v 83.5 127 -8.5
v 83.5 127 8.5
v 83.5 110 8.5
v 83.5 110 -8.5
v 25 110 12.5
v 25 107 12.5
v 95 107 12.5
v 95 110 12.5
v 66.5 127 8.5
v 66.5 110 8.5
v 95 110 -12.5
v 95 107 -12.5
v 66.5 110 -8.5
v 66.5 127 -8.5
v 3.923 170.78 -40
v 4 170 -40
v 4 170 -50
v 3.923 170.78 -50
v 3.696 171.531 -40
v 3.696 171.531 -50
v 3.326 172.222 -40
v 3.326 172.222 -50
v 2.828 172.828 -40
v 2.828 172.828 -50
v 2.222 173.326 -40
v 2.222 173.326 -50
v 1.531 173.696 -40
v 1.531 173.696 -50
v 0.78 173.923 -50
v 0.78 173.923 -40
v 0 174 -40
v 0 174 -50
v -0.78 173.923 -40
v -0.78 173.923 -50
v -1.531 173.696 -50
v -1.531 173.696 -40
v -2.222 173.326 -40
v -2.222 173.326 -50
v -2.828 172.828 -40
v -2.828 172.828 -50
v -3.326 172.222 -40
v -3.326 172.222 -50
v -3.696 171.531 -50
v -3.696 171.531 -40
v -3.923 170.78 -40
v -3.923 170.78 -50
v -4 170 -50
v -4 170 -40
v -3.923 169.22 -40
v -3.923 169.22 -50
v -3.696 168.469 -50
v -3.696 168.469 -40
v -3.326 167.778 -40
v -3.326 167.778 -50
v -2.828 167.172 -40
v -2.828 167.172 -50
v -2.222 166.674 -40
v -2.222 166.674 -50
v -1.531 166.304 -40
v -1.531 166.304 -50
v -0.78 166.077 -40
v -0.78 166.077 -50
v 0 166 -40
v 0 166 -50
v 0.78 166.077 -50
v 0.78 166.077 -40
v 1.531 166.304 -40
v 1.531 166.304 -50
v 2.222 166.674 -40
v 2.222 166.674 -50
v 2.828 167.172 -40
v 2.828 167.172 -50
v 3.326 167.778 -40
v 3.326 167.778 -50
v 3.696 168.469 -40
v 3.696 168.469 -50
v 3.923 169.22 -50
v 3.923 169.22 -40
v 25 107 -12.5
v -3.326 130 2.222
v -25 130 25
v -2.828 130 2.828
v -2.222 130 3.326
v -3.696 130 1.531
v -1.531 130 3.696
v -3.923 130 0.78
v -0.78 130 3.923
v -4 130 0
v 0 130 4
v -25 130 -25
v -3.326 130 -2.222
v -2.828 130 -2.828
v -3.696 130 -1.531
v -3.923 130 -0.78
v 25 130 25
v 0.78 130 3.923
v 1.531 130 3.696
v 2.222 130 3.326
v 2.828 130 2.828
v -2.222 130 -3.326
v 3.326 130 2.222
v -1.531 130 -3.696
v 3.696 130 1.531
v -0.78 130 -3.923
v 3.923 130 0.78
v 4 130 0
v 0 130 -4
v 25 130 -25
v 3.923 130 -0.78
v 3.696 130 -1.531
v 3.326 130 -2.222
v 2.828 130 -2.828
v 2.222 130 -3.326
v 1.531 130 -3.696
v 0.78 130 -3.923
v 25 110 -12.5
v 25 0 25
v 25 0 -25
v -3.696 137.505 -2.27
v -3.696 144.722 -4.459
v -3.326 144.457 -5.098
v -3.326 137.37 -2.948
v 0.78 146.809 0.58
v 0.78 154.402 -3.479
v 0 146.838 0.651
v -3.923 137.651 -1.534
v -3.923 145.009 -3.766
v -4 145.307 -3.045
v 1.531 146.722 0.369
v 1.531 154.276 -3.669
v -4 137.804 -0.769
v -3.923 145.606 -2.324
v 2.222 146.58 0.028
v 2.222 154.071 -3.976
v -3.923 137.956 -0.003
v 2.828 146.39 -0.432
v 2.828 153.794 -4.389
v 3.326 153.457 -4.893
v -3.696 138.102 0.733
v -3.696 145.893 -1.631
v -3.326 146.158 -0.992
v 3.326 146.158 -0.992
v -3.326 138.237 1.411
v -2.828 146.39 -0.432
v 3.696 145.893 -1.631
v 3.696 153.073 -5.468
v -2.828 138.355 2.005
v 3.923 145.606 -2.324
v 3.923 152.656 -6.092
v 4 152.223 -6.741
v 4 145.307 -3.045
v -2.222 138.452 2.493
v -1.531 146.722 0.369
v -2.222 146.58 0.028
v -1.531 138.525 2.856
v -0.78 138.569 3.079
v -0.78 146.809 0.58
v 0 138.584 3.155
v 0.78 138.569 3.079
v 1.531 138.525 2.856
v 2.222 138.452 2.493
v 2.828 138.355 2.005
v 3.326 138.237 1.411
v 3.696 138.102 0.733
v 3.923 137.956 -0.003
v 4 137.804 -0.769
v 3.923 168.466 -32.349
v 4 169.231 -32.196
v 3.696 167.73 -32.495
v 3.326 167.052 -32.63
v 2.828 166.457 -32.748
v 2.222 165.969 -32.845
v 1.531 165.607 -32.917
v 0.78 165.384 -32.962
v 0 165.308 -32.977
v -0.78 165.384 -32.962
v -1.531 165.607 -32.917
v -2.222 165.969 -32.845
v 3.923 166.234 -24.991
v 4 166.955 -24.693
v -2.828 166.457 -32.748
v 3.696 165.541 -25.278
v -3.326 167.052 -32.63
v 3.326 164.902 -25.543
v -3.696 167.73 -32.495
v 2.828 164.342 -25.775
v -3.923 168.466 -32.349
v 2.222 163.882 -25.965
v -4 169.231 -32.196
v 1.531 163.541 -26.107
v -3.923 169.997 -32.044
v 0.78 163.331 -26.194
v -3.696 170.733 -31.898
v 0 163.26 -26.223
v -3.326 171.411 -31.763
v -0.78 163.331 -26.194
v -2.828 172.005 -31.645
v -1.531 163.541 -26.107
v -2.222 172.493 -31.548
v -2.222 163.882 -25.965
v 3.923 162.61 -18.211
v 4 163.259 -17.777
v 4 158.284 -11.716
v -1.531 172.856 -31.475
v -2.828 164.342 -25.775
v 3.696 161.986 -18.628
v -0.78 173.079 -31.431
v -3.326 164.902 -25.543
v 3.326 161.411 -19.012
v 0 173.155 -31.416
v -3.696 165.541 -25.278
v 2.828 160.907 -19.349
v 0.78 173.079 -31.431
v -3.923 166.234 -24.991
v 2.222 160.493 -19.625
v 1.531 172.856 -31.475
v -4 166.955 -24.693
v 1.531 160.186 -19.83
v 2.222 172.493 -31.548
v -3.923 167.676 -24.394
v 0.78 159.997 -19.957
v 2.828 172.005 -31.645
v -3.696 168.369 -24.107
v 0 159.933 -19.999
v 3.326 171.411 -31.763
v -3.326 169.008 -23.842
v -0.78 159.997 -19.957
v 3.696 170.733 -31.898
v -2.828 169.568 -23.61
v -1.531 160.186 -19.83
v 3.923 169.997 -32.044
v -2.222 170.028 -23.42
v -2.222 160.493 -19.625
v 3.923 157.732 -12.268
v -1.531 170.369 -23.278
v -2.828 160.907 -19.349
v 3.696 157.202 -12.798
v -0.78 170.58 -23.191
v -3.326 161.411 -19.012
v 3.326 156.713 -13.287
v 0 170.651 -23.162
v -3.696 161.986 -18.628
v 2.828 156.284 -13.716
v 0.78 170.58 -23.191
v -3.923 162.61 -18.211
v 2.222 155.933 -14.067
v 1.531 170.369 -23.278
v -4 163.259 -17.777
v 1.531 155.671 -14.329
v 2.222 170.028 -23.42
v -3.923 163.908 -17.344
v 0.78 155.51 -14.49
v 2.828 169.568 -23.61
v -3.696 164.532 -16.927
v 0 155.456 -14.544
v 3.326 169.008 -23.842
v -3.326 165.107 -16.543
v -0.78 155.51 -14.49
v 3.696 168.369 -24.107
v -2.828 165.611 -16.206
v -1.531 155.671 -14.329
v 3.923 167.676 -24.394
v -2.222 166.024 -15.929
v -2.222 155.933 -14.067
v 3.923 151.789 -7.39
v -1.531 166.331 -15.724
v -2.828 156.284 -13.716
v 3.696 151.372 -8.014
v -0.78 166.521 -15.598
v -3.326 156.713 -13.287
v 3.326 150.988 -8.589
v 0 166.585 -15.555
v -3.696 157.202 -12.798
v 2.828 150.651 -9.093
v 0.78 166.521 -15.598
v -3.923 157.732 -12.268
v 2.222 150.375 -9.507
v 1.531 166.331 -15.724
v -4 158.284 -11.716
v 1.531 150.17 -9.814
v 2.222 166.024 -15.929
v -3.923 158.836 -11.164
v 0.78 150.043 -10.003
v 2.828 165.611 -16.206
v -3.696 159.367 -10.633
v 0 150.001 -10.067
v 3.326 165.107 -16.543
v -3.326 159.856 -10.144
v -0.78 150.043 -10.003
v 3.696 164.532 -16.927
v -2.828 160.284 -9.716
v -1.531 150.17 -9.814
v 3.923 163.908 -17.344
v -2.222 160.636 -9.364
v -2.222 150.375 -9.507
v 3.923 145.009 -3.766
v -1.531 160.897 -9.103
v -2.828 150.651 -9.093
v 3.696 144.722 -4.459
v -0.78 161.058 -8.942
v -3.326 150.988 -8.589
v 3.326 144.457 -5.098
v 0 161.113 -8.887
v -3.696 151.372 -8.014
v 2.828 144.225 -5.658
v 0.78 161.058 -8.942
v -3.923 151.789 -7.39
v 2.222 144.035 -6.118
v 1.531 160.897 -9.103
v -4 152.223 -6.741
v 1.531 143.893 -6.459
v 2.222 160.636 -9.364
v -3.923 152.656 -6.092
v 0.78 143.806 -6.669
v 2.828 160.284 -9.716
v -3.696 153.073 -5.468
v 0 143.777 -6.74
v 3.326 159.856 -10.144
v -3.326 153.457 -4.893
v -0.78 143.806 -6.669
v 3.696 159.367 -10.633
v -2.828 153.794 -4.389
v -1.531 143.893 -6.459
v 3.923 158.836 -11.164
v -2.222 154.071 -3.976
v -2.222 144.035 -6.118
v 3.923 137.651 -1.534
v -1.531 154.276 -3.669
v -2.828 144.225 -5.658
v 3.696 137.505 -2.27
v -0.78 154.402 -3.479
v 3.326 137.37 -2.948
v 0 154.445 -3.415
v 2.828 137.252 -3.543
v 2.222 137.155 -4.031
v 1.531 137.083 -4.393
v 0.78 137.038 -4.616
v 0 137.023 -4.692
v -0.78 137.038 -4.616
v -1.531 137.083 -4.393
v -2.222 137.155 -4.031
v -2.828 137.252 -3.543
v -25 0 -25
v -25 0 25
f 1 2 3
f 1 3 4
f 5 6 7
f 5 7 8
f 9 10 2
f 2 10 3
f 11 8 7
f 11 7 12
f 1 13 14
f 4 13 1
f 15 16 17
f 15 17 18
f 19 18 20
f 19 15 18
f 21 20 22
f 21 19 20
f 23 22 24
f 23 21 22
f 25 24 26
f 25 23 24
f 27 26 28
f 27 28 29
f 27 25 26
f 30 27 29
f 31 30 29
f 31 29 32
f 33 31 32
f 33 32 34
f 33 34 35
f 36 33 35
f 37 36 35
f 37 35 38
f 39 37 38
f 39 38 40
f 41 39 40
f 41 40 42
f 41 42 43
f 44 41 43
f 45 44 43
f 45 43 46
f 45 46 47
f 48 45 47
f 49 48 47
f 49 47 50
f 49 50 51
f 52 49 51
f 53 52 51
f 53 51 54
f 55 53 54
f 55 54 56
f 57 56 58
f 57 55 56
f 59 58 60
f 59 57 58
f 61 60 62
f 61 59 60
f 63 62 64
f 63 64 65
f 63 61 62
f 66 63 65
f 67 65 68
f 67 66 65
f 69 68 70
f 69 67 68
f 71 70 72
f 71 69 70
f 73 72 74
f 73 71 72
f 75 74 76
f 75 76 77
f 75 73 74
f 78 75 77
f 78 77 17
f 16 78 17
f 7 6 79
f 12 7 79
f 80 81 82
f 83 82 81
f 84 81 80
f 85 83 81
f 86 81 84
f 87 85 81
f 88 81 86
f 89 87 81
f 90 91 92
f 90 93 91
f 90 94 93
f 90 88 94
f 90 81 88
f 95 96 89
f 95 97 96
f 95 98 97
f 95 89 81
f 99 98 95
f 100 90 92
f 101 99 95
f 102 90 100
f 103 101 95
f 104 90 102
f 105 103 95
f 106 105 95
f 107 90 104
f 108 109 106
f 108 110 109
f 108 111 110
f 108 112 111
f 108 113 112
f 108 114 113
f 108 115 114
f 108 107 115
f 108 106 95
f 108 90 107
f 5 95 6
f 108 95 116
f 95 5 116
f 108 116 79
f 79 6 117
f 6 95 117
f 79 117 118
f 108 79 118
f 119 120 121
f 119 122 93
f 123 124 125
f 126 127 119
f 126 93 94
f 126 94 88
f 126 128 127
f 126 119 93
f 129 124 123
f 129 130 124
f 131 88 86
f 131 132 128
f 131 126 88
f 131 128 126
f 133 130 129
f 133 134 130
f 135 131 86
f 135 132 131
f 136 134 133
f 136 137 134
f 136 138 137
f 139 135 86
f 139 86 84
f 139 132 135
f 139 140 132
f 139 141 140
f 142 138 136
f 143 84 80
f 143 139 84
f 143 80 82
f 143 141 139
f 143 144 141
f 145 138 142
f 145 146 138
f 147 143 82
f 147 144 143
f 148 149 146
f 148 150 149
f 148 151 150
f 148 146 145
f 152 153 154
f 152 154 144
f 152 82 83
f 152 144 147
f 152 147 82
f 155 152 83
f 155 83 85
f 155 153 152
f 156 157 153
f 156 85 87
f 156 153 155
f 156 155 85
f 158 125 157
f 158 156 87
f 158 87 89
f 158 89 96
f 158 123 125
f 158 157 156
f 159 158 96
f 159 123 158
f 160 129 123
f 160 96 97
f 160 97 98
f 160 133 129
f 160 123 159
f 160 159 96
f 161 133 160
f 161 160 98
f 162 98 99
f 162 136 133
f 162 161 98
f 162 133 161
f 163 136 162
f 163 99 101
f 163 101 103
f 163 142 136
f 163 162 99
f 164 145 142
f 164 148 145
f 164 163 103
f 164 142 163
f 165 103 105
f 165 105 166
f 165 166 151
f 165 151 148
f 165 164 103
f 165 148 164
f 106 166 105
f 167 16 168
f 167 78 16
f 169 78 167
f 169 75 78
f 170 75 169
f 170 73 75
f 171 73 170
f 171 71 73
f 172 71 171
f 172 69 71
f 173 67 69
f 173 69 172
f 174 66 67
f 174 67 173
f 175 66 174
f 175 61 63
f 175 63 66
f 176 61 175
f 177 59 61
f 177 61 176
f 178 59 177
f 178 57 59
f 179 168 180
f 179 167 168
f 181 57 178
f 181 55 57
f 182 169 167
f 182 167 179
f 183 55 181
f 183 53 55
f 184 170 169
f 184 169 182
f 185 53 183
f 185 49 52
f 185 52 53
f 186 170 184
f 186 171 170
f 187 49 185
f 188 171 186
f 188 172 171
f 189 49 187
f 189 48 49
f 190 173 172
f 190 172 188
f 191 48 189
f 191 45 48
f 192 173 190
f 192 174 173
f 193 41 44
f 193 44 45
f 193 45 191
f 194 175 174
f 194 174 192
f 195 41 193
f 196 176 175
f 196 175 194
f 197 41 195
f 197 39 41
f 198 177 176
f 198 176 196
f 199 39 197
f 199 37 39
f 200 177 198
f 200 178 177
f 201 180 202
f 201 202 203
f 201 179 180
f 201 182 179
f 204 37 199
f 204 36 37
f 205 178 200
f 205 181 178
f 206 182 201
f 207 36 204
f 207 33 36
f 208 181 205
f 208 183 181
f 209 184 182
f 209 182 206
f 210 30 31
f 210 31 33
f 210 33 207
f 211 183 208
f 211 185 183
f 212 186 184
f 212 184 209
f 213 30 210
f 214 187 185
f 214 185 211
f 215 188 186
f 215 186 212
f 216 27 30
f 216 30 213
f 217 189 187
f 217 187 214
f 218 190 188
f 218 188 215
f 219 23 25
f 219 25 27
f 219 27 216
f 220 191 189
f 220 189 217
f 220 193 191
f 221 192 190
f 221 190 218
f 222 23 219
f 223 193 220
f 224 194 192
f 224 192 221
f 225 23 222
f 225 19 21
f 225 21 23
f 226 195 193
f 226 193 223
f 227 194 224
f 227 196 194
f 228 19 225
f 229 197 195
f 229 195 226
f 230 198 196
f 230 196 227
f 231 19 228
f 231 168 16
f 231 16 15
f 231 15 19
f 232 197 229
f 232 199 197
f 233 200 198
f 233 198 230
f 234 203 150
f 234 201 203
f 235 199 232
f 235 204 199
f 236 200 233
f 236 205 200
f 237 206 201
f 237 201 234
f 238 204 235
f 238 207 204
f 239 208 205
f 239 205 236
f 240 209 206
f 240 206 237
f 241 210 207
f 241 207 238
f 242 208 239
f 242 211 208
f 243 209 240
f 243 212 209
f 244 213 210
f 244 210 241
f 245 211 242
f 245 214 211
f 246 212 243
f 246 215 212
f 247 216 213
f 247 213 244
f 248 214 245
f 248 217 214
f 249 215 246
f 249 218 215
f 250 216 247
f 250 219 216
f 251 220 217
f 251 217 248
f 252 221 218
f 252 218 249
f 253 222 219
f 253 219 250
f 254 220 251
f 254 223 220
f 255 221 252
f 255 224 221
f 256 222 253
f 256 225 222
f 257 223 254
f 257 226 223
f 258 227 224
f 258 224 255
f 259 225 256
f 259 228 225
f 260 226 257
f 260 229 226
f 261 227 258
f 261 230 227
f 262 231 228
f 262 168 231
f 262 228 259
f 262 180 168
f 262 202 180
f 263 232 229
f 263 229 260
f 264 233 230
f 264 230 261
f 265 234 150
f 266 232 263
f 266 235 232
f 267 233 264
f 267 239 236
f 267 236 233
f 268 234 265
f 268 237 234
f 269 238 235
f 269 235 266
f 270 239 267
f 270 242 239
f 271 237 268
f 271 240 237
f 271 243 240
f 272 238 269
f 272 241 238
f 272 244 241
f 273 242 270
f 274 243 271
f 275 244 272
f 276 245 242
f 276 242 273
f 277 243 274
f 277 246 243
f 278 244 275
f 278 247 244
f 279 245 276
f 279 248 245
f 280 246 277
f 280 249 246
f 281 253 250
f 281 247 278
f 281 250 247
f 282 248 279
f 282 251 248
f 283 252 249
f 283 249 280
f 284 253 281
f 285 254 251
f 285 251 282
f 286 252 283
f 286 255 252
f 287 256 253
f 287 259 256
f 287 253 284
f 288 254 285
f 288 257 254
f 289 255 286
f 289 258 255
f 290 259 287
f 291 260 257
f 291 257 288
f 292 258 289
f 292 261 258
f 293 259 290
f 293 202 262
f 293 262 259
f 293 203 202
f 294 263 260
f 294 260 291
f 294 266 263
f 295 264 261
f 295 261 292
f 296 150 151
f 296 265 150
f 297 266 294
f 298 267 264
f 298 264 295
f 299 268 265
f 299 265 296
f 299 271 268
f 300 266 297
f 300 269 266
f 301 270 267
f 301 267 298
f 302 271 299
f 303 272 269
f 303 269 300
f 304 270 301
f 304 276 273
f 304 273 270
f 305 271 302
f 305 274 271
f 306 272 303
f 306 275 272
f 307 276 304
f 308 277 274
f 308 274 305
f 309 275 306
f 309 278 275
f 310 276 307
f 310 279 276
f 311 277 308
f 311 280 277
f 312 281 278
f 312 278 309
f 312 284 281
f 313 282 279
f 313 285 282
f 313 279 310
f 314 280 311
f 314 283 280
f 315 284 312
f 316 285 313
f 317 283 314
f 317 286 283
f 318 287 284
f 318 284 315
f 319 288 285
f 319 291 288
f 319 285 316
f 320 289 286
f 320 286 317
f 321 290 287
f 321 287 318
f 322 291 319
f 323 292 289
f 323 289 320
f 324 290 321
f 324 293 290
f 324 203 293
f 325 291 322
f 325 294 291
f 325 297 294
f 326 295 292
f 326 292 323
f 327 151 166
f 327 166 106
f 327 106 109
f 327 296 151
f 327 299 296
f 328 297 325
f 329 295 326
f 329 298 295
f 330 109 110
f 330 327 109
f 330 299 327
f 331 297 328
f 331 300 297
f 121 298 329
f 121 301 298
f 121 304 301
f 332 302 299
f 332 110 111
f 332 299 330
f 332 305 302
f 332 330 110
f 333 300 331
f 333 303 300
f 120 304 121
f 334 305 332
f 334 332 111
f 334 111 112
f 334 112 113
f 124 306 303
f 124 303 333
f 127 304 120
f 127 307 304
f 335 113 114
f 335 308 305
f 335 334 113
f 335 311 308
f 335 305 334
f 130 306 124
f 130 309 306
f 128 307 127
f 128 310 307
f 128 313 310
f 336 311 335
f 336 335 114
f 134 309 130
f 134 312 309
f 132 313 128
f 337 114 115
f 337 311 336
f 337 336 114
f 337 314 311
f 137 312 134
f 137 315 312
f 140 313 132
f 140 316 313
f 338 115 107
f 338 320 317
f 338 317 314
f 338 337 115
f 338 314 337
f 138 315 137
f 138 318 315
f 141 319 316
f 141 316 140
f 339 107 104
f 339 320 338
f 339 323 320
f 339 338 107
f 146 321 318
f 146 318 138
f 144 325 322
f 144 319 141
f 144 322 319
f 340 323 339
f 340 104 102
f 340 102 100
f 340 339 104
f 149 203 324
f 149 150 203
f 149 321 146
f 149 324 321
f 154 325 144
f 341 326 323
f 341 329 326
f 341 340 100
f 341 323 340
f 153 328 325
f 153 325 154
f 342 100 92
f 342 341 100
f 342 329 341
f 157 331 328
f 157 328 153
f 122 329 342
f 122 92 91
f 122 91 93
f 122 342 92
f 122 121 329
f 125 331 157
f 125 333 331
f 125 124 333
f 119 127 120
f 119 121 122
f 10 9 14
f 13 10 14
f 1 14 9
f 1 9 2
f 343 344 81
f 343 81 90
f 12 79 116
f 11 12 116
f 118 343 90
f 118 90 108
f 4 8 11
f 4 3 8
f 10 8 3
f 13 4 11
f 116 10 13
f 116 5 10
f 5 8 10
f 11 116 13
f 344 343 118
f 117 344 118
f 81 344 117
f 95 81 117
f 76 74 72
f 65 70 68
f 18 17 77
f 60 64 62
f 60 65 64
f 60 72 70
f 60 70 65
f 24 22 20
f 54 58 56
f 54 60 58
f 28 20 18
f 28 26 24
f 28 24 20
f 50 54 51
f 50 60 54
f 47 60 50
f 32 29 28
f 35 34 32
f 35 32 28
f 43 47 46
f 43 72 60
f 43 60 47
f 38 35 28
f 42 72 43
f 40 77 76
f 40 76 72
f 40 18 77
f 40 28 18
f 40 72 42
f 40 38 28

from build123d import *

# Parameters (mm, degrees)
ESBO_O1_W                = 50
ESBO_O1_H                = 50
RESSALTO_EXTRUS_O1_DEPTH = 130
ESBO_O2_W                = 25
ESBO_O2_H                = 3
RESSALTO_EXTRUS_O2_DEPTH = 70
ESBO_O4_W                = 17
ESBO_O4_H                = 17
RESSALTO_EXTRUS_O3_DEPTH = 17
ESBO_O5_R                = 4


with BuildPart() as part:
    # Esboço1 → Ressalto-extrusão1 (new body)
    with BuildSketch(Plane(origin=(0, 0, 0), x_dir=(1, 0, 0), z_dir=(0, 1, 0))):
        Rectangle(ESBO_O1_W, ESBO_O1_H)
    extrude(amount=RESSALTO_EXTRUS_O1_DEPTH)

    # Esboço2 → Ressalto-extrusão2 (add)
    with BuildSketch(Plane(origin=(25, 0, 0), x_dir=(0, 0, -1), z_dir=(1, 0, 0))):
        with Locations((0, 108.5)):
            Rectangle(ESBO_O2_W, ESBO_O2_H)
    extrude(amount=RESSALTO_EXTRUS_O2_DEPTH)

    # Esboço4 → Ressalto-extrusão3 (add)
    with BuildSketch(Plane(origin=(0, 110, 0), x_dir=(1, 0, 0), z_dir=(0, 1, 0))):
        with Locations((75, 0)):
            Rectangle(ESBO_O4_W, ESBO_O4_H)
    extrude(amount=RESSALTO_EXTRUS_O3_DEPTH)

    # Varredura1: sweep along a path in Esboço6
    with BuildLine(Plane(origin=(0, 0, 0), x_dir=(0, 0, -1), z_dir=(1, 0, 0))) as varredura1_path:
        Line((50, 170), (40, 170))
        ThreePointArc((40, 170), (11.715728753, 158.284271247), (0, 130))
    # Esboço5 → Varredura1 (sweep)
    with BuildSketch(Plane(origin=(0, 130, 0), x_dir=(1, 0, 0), z_dir=(0, 1, 0))):
        Circle(ESBO_O5_R)
    sweep(path=varredura1_path.line)


solid = part.part
